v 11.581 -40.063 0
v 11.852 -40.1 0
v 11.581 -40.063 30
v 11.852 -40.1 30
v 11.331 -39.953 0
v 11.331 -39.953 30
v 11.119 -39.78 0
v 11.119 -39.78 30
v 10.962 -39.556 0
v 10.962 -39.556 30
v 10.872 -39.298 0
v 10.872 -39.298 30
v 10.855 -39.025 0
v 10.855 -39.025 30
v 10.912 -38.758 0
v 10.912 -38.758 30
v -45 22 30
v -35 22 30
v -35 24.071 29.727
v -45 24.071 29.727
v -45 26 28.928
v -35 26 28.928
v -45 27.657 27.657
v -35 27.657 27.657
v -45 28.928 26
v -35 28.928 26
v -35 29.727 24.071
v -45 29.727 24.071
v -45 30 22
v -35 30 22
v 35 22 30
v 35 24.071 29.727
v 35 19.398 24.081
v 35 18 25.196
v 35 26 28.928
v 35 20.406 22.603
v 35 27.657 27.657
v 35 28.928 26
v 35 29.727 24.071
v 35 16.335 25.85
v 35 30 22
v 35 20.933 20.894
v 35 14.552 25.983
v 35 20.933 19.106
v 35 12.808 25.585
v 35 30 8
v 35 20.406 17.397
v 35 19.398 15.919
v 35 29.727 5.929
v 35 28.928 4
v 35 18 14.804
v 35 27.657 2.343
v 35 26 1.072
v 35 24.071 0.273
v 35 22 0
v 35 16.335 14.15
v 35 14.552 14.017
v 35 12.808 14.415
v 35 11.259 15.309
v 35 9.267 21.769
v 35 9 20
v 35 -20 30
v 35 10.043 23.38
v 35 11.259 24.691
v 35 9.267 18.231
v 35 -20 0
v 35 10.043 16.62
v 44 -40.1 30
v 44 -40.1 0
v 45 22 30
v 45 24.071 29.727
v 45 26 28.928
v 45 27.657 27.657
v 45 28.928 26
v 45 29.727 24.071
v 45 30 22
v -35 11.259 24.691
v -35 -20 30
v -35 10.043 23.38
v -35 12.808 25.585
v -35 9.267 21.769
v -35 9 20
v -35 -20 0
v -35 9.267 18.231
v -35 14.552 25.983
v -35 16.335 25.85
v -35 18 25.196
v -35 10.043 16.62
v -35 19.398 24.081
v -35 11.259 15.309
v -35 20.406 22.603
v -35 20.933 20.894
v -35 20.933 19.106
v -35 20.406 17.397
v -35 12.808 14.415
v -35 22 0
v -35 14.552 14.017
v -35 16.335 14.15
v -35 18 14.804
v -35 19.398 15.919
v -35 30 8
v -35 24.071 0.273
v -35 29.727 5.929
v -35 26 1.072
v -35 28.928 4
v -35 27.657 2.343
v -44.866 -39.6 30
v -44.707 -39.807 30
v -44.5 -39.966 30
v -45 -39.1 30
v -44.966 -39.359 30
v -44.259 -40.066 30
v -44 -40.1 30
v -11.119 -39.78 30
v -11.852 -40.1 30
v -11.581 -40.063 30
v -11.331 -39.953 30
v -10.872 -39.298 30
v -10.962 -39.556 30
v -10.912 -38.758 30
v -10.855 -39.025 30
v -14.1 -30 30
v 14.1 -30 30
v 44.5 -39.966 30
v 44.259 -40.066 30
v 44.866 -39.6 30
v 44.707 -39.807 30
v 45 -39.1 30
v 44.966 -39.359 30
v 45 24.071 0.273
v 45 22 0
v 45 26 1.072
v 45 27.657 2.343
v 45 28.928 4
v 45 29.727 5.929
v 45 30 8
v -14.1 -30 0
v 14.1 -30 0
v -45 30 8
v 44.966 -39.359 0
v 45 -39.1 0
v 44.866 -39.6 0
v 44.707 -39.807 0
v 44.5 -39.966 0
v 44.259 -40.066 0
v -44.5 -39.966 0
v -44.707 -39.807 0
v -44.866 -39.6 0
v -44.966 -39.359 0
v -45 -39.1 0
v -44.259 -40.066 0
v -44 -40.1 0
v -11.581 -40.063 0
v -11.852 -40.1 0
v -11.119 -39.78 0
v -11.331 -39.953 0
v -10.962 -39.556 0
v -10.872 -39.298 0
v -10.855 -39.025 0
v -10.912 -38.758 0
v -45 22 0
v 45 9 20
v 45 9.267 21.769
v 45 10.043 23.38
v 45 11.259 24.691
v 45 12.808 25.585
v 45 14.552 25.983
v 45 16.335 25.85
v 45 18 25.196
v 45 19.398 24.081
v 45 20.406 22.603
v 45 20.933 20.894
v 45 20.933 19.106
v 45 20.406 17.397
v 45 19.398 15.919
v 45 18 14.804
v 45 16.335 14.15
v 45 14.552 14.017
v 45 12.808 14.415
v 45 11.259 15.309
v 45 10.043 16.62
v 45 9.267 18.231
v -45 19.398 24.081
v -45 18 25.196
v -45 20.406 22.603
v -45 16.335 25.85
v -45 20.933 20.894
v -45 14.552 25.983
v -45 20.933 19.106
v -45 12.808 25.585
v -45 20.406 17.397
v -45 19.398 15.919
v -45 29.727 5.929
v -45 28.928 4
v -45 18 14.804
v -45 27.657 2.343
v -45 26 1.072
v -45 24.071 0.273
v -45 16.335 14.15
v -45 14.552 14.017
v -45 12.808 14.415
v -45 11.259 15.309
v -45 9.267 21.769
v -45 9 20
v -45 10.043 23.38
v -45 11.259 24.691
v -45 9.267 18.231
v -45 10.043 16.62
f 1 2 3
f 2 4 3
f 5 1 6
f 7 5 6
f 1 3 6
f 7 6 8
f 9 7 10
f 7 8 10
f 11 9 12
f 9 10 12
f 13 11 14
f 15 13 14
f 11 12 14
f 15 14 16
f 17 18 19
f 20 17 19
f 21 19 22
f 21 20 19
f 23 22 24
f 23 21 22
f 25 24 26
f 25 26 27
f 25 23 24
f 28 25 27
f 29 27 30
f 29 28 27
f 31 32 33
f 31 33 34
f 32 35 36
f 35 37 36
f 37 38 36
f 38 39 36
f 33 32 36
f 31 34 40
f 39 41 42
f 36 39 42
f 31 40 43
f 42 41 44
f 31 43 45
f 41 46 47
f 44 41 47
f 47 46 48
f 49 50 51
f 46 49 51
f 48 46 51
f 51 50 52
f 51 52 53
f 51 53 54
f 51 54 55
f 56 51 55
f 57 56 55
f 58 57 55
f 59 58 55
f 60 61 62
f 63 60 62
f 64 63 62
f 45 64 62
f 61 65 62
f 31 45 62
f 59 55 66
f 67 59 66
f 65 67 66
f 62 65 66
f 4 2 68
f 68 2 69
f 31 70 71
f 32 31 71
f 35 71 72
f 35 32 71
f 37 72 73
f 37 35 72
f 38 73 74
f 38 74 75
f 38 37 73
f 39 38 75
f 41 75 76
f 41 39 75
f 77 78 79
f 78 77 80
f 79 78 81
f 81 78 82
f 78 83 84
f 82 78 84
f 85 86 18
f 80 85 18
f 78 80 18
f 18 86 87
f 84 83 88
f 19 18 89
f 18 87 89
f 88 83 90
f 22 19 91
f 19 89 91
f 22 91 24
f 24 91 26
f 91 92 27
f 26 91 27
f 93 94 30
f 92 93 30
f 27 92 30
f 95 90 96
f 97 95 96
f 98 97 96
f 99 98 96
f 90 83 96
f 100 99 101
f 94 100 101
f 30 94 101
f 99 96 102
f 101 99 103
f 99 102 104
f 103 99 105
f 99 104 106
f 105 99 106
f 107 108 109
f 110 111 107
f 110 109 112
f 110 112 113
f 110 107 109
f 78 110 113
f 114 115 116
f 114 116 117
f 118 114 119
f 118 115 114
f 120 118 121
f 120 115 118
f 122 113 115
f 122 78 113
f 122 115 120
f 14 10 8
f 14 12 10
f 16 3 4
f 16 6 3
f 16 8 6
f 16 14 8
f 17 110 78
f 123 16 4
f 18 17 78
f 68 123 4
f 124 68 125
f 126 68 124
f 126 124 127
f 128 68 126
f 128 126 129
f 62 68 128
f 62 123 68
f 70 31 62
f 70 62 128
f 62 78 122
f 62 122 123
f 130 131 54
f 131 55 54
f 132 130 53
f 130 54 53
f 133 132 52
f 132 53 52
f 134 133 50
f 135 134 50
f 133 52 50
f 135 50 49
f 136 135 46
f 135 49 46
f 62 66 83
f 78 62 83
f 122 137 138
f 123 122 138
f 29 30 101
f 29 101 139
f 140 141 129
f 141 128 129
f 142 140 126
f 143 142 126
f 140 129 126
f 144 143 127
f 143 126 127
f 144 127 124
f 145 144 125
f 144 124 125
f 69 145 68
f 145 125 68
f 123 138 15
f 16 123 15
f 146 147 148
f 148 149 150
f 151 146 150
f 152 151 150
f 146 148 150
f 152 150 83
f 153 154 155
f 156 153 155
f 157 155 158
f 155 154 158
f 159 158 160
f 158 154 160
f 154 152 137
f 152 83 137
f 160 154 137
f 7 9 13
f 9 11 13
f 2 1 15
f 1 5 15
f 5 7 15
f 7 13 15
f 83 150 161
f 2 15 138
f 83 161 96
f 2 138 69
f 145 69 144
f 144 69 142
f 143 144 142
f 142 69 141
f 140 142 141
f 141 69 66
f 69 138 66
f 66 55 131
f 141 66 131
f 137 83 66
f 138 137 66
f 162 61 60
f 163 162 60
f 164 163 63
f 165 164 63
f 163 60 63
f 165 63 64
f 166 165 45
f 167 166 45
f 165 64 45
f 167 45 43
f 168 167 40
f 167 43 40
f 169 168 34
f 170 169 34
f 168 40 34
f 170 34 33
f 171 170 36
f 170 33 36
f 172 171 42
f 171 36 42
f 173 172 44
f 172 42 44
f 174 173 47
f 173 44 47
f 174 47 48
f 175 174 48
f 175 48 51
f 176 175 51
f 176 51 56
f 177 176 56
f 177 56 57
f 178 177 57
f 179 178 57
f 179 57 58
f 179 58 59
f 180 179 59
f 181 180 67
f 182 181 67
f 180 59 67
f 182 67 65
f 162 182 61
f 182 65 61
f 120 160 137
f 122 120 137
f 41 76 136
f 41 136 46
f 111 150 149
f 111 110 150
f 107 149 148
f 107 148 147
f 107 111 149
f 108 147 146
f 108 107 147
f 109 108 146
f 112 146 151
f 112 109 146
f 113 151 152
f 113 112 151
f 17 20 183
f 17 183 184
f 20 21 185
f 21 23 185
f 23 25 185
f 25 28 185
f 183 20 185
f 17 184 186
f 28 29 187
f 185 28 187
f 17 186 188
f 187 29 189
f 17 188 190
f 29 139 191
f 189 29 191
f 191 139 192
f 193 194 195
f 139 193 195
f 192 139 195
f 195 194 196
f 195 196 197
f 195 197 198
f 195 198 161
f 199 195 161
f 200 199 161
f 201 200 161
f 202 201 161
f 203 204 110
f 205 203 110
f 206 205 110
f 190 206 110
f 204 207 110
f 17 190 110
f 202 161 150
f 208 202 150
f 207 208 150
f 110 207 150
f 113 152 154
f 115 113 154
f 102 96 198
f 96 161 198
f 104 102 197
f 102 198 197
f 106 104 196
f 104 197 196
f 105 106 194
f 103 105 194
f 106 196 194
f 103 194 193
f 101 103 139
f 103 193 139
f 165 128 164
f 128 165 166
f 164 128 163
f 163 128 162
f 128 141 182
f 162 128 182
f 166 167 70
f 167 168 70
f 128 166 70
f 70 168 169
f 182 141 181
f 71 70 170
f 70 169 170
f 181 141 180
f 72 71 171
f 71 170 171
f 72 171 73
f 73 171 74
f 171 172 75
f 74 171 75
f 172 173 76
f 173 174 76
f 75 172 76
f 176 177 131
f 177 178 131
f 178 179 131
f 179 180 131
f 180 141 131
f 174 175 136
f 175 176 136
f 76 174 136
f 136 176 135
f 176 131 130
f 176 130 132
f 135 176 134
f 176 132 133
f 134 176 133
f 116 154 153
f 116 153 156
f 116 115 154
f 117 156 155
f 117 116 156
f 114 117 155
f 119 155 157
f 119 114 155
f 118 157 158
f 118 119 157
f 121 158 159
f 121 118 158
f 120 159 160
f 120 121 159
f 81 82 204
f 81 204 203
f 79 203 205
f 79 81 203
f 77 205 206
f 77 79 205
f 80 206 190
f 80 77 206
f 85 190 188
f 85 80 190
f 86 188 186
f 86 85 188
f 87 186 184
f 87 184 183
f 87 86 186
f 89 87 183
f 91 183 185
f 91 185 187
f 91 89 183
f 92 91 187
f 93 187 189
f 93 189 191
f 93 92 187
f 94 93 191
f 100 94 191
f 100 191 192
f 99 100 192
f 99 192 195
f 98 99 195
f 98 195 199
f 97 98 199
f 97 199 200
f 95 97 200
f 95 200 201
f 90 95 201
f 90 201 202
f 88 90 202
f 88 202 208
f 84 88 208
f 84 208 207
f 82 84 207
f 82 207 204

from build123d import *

# Parameters (mm, degrees)
F1_DEPTH      = 30
F2_R          = 6
F3_DEPTH      = 10
F3_DEPTH_BACK = 80
F4_R          = 8
F5_R          = 1


with BuildPart() as f1:
    # F0 (on Top) → F1 (new body)
    with BuildSketch(Plane.XY):
        Polygon((-14.1, -30), (-45, -30), (-45, -40.1), (-10.4239006339, -40.1), align=None)
        Polygon((45, -30), (14.1, -30), (10.4239006339, -40.1), (45, -40.1), align=None)
        Polygon((-35, 30), (-45, 30), (-45, -30), (-14.1, -30), (14.1, -30), (45, -30), (45, 30), (35, 30), (35, -20), (-35, -20), align=None)
    extrude(amount=F1_DEPTH)

    # F2 (on face) → F3 (cut, two sides)
    with BuildSketch(Plane(origin=(35, 0, 0), x_dir=(0, -1, 0), z_dir=(-1, 0, 0))) as f3_sk:
        with Locations((-15, 20)):
            Circle(F2_R)
    extrude(amount=-F3_DEPTH, mode=Mode.SUBTRACT)
    extrude(f3_sk.sketch, amount=F3_DEPTH_BACK, mode=Mode.SUBTRACT)

    # F4
    f4_edges = [f1.edges().sort_by_distance(p)[0] for p in [
        (40, 30, 30),
        (40, 30, 0),
        (-40, 30, 30),
        (-40, 30, 0),
    ]]
    fillet(f4_edges, radius=F4_R)

    # F5
    f5_edges = [f1.edges().sort_by_distance(p)[0] for p in [
        (-10.423901, -40.1, 15),
        (10.423901, -40.1, 15),
        (45, -40.1, 15),
        (-45, -40.1, 15),
    ]]
    fillet(f5_edges, radius=F5_R)


solid = f1.part
